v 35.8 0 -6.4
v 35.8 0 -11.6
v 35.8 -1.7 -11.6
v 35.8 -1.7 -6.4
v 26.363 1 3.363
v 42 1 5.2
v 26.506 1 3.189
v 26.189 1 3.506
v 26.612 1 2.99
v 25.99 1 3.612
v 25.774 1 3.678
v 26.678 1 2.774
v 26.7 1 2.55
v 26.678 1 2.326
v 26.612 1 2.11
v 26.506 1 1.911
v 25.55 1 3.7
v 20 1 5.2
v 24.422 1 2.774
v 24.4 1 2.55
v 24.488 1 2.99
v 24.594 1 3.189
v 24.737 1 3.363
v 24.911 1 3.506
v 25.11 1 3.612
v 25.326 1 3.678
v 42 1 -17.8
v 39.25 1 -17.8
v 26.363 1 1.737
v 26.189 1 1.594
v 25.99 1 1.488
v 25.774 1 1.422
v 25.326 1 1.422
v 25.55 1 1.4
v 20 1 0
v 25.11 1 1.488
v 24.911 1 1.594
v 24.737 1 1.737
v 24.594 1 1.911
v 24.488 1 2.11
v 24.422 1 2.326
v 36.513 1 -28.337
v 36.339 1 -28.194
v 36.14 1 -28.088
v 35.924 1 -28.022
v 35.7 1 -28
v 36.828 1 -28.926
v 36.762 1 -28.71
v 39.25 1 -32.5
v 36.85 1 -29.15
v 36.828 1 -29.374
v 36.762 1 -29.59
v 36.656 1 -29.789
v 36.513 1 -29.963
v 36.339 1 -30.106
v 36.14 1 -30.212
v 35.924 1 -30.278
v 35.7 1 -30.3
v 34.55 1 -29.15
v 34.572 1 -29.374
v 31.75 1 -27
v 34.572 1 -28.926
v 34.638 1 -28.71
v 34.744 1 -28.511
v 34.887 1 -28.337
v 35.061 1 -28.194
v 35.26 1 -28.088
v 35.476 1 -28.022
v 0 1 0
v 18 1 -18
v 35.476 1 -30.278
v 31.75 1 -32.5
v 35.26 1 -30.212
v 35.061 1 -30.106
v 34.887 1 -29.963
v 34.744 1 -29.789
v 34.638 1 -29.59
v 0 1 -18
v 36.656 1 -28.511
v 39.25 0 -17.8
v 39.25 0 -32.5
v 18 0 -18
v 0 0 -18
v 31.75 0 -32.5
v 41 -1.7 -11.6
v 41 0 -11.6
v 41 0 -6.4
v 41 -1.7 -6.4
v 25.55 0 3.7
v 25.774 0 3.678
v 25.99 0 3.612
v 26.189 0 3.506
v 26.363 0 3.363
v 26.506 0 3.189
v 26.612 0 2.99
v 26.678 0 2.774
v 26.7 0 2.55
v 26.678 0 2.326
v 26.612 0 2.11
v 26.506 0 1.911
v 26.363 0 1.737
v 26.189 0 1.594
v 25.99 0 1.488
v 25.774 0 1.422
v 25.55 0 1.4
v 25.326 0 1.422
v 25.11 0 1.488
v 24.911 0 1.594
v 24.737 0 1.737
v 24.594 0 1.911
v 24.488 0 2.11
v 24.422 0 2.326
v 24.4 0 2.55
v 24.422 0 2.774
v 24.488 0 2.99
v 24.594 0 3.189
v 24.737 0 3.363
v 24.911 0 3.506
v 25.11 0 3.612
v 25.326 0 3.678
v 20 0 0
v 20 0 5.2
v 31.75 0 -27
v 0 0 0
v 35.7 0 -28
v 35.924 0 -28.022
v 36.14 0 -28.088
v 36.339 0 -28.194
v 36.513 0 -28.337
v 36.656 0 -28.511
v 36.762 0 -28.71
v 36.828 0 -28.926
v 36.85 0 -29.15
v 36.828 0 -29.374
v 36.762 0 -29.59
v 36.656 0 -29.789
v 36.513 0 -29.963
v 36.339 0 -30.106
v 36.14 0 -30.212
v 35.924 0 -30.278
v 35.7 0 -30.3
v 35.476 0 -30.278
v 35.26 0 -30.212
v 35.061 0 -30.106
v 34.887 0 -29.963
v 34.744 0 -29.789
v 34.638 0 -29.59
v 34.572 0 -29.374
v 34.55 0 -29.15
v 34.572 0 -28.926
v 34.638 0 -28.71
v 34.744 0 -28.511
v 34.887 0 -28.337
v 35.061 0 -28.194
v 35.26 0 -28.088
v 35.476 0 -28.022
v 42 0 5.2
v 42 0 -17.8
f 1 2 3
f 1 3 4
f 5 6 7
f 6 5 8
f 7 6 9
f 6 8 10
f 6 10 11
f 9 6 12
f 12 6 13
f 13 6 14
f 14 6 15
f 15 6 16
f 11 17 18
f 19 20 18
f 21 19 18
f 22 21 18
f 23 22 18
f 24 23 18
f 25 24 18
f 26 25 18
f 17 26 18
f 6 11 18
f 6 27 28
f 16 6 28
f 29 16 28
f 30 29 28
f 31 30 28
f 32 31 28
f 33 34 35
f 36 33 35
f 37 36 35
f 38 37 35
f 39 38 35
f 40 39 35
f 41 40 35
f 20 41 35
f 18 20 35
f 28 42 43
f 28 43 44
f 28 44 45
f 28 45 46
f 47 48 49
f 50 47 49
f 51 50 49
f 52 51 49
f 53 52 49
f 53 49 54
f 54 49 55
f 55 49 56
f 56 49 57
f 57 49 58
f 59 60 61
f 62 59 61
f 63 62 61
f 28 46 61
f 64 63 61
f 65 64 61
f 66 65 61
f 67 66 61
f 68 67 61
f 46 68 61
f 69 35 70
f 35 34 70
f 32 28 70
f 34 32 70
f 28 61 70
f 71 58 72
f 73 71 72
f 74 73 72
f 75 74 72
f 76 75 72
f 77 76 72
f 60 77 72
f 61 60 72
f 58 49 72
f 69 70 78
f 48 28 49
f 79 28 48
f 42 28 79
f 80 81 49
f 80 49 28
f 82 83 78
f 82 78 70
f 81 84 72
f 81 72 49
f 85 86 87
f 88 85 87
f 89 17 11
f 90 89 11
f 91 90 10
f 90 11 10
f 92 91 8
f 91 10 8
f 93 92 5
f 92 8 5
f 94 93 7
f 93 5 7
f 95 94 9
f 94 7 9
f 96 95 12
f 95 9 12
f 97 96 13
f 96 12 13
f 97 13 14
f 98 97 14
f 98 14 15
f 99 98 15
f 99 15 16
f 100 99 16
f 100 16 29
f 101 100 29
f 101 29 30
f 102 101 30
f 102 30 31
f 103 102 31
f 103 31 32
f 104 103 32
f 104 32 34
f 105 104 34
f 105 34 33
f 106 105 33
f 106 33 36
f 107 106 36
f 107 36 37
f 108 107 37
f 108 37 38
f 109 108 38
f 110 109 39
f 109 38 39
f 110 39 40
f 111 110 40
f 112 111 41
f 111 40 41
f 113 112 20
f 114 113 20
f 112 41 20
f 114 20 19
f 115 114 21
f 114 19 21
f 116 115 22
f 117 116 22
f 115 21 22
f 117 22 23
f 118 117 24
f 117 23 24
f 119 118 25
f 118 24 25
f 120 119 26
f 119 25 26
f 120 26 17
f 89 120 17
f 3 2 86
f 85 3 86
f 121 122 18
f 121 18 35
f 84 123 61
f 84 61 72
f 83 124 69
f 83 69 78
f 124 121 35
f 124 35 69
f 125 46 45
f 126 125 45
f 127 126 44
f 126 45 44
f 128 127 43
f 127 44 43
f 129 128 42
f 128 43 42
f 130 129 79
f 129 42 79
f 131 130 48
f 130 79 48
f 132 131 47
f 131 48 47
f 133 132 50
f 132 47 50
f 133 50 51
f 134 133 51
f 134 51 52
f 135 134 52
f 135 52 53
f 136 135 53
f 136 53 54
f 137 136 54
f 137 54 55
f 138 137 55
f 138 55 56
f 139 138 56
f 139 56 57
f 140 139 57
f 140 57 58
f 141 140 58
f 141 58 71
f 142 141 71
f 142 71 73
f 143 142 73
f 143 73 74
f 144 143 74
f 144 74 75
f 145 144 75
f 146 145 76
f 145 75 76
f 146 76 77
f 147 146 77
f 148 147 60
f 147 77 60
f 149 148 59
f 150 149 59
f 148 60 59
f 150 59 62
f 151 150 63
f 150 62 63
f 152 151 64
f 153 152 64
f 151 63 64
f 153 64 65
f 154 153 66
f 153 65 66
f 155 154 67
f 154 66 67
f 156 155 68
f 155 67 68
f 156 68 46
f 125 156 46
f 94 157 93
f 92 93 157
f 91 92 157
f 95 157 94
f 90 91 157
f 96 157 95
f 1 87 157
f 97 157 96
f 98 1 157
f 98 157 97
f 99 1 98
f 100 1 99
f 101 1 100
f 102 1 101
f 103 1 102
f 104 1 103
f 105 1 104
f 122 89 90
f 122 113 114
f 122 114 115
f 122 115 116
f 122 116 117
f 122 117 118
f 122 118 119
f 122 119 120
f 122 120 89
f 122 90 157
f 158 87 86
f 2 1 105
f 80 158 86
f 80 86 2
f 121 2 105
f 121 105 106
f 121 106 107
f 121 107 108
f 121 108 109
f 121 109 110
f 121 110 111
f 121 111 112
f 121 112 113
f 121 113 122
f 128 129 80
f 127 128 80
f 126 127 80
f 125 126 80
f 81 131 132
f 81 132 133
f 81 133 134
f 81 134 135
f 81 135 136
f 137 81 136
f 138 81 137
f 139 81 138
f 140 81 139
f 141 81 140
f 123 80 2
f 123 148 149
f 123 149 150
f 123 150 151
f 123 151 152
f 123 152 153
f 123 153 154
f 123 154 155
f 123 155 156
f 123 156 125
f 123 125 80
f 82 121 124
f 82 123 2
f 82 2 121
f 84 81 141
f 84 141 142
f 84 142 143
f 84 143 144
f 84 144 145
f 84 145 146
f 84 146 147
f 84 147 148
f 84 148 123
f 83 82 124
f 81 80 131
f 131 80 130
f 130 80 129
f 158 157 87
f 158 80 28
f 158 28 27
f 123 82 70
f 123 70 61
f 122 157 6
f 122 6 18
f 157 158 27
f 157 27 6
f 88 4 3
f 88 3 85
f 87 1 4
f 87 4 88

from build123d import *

# Parameters (mm, degrees)
EXTRUDE_1_DEPTH     = 1
SKETCH_2_R          = 1.15
CUT_EXTRUDE_1_DEPTH = 54.115440316
SKETCH_3_R          = 1.15
CUT_EXTRUDE_2_DEPTH = 54.115440316
SKETCH_4_W          = 5.2
SKETCH_4_H          = 5.2
EXTRUDE_2_DEPTH     = 1.7


with BuildPart() as part:
    # Эскиз1 → Бобышка-Вытянуть1 (new body)
    with BuildSketch(Plane(origin=(0, 0, 0), x_dir=(1, 0, 0), z_dir=(0, 1, 0))):
        Polygon((0, 0), (0, 18), (18, 18), (31.75, 27), (31.75, 32.5), (39.25, 32.5), (39.25, 17.8), (42, 17.8), (42, -5.2), (20, -5.2), (20, 0), align=None)
    extrude(amount=EXTRUDE_1_DEPTH)

    # Эскиз2 → Вырез-Вытянуть1 (cut, through all)
    with BuildSketch(Plane(origin=(0, 1, 0), x_dir=(1, 0, 0), z_dir=(0, 1, 0))):
        with Locations(Location((35.7, 29.15, 0), (0, 0, 270))):
            Circle(SKETCH_2_R)
    extrude(amount=-CUT_EXTRUDE_1_DEPTH, mode=Mode.SUBTRACT)

    # Эскиз3 → Вырез-Вытянуть2 (cut, through all)
    with BuildSketch(Plane(origin=(0, 1, 0), x_dir=(1, 0, 0), z_dir=(0, 1, 0))):
        with Locations(Location((25.55, -2.55, 0), (0, 0, 270))):
            Circle(SKETCH_3_R)
    extrude(amount=-CUT_EXTRUDE_2_DEPTH, mode=Mode.SUBTRACT)

    # Эскиз4 → Бобышка-Вытянуть2 (add)
    with BuildSketch(Plane.XZ):
        with Locations((38.4, -9)):
            Rectangle(SKETCH_4_W, SKETCH_4_H)
    extrude(amount=EXTRUDE_2_DEPTH)


solid = part.part
